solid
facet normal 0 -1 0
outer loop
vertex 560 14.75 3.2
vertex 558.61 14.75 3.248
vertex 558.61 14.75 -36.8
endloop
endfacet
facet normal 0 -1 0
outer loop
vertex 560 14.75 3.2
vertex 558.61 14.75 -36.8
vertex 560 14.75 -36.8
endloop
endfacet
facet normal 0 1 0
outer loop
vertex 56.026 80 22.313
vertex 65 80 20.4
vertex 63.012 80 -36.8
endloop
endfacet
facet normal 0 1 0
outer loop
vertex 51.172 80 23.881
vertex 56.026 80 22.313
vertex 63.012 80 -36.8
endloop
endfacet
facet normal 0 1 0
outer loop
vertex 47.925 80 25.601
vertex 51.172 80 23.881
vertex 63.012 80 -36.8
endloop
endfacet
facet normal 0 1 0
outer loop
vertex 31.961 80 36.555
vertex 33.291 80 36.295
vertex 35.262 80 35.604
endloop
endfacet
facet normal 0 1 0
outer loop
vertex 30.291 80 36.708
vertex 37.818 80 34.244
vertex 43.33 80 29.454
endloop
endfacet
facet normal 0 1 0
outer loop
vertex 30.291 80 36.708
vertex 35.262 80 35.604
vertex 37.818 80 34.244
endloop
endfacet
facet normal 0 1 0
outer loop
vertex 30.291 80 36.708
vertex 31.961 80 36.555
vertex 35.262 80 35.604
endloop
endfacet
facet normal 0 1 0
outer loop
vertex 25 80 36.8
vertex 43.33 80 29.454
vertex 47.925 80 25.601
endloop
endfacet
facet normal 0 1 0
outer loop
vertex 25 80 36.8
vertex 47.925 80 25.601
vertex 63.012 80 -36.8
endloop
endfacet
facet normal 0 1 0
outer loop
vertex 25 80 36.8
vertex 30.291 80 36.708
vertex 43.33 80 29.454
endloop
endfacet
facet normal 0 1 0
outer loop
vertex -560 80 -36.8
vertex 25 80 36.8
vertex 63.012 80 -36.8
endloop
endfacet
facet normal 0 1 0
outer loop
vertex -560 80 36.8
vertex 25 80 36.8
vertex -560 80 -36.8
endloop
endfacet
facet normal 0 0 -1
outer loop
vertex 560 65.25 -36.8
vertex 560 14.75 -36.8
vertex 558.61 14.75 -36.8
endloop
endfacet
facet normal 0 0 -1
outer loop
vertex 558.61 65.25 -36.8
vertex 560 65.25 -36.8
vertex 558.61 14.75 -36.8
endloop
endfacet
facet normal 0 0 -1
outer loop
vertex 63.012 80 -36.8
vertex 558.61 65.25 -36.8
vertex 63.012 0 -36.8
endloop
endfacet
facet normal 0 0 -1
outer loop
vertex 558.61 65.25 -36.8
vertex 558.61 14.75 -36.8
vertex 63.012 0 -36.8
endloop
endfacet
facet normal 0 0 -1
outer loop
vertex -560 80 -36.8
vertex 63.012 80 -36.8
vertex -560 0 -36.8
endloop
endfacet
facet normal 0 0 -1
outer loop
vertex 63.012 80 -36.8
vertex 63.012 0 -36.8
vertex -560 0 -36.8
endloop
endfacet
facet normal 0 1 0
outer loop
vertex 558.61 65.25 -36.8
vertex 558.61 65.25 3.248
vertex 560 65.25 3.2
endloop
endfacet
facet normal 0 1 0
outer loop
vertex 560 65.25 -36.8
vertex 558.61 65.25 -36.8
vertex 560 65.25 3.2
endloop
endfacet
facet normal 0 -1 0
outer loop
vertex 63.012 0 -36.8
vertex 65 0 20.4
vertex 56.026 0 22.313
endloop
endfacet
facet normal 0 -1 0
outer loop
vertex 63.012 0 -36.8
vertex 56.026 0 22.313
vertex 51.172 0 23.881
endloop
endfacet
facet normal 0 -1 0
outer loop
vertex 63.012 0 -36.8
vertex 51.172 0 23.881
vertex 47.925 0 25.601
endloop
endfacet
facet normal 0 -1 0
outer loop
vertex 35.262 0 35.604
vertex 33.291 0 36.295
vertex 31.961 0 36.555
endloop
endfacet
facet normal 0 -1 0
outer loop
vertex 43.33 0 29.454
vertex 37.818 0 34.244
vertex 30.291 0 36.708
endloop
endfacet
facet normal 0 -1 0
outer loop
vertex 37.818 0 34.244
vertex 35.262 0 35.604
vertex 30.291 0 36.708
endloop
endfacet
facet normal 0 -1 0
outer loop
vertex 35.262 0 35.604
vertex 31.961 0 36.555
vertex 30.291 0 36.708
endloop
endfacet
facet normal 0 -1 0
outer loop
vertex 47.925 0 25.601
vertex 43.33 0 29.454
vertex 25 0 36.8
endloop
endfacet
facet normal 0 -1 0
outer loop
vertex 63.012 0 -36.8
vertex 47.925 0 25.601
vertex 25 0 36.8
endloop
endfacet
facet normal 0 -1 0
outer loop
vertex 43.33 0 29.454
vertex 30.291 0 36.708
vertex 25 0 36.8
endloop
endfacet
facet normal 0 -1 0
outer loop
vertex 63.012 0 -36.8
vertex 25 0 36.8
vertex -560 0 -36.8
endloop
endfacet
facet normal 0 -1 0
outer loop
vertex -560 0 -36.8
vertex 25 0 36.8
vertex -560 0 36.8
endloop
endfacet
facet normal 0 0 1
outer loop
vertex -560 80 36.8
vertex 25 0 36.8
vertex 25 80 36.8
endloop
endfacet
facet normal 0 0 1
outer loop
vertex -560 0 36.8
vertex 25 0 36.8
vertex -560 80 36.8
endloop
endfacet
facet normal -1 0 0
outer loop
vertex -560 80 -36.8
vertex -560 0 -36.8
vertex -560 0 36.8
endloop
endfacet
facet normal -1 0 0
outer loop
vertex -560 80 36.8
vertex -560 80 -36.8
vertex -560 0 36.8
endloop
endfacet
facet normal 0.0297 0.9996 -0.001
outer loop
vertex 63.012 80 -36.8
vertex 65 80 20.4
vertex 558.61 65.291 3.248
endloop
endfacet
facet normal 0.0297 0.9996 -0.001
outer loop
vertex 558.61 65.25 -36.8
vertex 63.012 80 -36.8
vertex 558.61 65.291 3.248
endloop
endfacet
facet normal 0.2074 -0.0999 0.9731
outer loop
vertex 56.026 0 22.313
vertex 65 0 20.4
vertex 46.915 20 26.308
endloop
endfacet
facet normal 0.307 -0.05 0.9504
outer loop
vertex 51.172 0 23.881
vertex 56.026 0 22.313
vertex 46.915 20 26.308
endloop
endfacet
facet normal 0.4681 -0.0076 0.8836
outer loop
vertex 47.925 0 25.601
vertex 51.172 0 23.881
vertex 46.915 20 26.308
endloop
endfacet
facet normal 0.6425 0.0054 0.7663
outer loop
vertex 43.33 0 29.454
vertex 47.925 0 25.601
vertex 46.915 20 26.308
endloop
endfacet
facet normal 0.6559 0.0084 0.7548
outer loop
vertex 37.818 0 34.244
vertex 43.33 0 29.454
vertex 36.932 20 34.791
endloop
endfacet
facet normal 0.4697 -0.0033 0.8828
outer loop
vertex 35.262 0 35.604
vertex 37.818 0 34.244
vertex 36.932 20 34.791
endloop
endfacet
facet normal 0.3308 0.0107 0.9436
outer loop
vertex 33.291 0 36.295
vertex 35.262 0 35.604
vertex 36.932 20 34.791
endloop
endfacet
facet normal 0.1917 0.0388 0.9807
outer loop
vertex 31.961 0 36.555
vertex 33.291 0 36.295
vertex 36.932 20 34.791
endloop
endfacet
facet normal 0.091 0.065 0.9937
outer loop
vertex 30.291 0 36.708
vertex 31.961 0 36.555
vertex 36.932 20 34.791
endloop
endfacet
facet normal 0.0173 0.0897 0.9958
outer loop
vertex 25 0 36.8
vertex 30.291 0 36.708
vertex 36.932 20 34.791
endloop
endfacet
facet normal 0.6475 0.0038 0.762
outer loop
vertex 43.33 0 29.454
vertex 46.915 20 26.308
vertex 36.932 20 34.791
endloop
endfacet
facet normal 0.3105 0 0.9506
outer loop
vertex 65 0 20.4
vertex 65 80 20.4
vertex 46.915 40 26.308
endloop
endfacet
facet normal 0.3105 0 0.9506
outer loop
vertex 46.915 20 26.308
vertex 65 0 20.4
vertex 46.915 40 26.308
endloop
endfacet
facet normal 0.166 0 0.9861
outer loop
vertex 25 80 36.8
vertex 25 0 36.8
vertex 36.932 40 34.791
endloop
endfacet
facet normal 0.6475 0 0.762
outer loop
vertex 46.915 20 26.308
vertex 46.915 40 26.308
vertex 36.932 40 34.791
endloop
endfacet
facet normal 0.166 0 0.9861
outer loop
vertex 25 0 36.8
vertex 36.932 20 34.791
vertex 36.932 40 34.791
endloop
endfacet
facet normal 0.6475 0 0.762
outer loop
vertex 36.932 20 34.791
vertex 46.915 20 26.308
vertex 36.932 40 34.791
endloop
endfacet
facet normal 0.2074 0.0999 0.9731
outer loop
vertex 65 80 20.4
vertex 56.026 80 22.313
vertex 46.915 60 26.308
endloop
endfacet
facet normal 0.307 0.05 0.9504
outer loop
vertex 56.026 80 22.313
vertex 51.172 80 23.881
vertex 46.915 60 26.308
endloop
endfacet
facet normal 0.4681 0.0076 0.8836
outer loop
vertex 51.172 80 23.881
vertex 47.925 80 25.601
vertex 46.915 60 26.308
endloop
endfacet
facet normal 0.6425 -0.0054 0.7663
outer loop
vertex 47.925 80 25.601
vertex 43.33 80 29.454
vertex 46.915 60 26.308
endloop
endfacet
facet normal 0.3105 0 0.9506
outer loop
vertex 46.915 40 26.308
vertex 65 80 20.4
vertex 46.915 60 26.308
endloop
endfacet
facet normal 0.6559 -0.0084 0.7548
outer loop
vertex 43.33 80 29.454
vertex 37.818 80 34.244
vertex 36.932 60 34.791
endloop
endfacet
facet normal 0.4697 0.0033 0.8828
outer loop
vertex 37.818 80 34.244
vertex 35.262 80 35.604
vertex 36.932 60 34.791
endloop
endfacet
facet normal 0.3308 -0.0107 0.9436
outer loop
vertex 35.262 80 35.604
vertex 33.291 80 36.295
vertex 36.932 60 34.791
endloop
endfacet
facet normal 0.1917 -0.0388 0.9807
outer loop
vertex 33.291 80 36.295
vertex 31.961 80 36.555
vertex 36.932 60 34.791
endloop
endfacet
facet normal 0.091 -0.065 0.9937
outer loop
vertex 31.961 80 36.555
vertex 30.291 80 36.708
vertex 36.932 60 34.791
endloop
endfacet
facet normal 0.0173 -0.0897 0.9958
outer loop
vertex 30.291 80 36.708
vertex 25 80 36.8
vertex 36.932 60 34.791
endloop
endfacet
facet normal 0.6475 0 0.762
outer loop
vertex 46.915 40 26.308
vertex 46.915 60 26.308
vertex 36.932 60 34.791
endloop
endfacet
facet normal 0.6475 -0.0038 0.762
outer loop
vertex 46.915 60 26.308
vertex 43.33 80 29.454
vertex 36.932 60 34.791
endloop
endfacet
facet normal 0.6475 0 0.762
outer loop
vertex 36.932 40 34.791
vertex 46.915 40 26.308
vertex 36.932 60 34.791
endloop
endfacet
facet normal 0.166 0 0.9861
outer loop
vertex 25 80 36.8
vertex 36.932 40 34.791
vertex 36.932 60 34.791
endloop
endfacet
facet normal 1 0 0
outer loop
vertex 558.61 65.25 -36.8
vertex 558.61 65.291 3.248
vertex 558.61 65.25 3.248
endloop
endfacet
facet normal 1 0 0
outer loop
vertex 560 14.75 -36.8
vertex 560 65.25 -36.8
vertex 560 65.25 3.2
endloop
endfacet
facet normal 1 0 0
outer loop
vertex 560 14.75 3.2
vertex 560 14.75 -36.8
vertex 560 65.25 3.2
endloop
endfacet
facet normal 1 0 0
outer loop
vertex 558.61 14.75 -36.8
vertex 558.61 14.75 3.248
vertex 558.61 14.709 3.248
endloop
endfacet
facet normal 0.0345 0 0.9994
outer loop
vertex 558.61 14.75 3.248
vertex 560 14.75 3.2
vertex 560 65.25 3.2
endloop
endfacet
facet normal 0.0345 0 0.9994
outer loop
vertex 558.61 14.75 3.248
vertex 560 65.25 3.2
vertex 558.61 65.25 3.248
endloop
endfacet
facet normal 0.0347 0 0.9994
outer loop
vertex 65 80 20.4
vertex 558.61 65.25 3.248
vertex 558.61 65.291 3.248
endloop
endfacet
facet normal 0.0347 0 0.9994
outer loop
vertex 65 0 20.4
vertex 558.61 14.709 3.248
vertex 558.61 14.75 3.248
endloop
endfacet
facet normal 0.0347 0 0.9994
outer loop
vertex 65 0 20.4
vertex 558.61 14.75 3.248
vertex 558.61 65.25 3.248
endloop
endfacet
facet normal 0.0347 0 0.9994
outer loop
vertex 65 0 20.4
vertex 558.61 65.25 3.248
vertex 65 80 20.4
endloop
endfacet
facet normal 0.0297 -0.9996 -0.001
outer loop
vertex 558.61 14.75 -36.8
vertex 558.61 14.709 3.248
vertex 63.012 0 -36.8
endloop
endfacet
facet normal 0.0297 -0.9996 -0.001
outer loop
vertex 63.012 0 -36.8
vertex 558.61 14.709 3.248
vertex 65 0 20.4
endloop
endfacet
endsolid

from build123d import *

# Parameters (mm, degrees)
CROQUIS1_W                 = 1120
CROQUIS1_H                 = 73.6
SALIENTE_EXTRUIR2_DEPTH    = 80
CORTAR_EXTRUIR1_DEPTH      = 567.881151565
CORTAR_EXTRUIR1_DEPTH_BACK = 80
CORTAR_EXTRUIR2_DEPTH      = 80
CORTAR_EXTRUIR6_DEPTH      = 80
CROQUIS9_W                 = 1.38989899
CROQUIS9_H                 = 14.75
CORTAR_EXTRUIR7_DEPTH      = 80
CORTAR_EXTRUIR11_DEPTH     = 80
CROQUIS11_W                = 1.38989899
CROQUIS11_H                = 14.75
CORTAR_EXTRUIR12_DEPTH     = 80


with BuildPart() as part:
    # Croquis1 → Saliente-Extruir2 (new body)
    with BuildSketch(Plane(origin=(0, 0, 0), x_dir=(-1, 0, 0), z_dir=(0, 1, 0))):
        Rectangle(CROQUIS1_W, CROQUIS1_H)
    extrude(amount=SALIENTE_EXTRUIR2_DEPTH)

    # Croquis3 → Cortar-Extruir1 (cut, two sides: drawn at the far end of the back side and taken through both)
    with BuildSketch(Plane(origin=(0, 80, 0), x_dir=(-1, 0, 0), z_dir=(0, 1, 0)).offset(-CORTAR_EXTRUIR1_DEPTH_BACK)):
        Polygon((-2813.471365519, -75.102439368), (-560, 3.2), (-65, 20.4), (-65, 36.8), (-560, 36.8), (-2814.831361149, 36.8), (-7324.161069919, -18.003708809), (-7322.801074288, -129.906148176), align=None)
    extrude(amount=CORTAR_EXTRUIR1_DEPTH + CORTAR_EXTRUIR1_DEPTH_BACK, mode=Mode.SUBTRACT)

    # Croquis5 → Cortar-Extruir2 (cut)
    with BuildSketch(Plane(origin=(0, 80, 0), x_dir=(-1, 0, 0), z_dir=(0, 1, 0))):
        with BuildLine():
            Line((-65, 20.4), (-65, 36.8))
            Line((-65, 36.8), (-25, 36.8))
            add(Edge.make_bspline(
                [(-65, 20.4), (-56.784244263, 22.107577244), (-47.818766965, 23.337438109), (-39.843013972, 33.586115732), (-32.987752431, 36.631059032), (-31.175714622, 36.8), (-25, 36.8)],
                knots=[0, 0, 0, 0, 0.422650191, 0.727847648, 0.789397597, 1, 1, 1, 1], degree=3))
        make_face()
    extrude(amount=-CORTAR_EXTRUIR2_DEPTH, mode=Mode.SUBTRACT)

    # Croquis6 → Cortar-Extruir6 (cut)
    with BuildSketch(Plane(origin=(0.786379176, 0, 22.631261168), x_dir=(0.9993968526186474, 0, -0.0347265168990722), z_dir=(0.0347265168990722, 0, 0.9993968526186474))):
        Polygon((64.252374475, 0), (559.551112612, 0), (559.551112612, 14.75), align=None)
    extrude(amount=-CORTAR_EXTRUIR6_DEPTH, mode=Mode.SUBTRACT)

    # Croquis9 → Cortar-Extruir7 (cut)
    with BuildSketch(Plane(origin=(0, 0, -36.8), x_dir=(1, 0, 0), z_dir=(0, 0, -1))):
        with Locations((559.305050505, -7.375)):
            Rectangle(CROQUIS9_W, CROQUIS9_H)
    extrude(amount=-CORTAR_EXTRUIR7_DEPTH, mode=Mode.SUBTRACT)

    # Croquis10 → Cortar-Extruir11 (cut)
    with BuildSketch(Plane(origin=(0.786379176, 0, 22.631261168), x_dir=(0.9993968526186474, 0, -0.0347265168990722), z_dir=(0.0347265168990722, 0, 0.9993968526186474))):
        Polygon((64.252374475, 80), (559.551112612, 65.25), (559.551112612, 80), align=None)
    extrude(amount=-CORTAR_EXTRUIR11_DEPTH, mode=Mode.SUBTRACT)

    # Croquis11 → Cortar-Extruir12 (cut)
    with BuildSketch(Plane(origin=(0, 0, -36.8), x_dir=(1, 0, 0), z_dir=(0, 0, -1))):
        with Locations((559.305050505, -72.625)):
            Rectangle(CROQUIS11_W, CROQUIS11_H)
    extrude(amount=-CORTAR_EXTRUIR12_DEPTH, mode=Mode.SUBTRACT)


solid = part.part
